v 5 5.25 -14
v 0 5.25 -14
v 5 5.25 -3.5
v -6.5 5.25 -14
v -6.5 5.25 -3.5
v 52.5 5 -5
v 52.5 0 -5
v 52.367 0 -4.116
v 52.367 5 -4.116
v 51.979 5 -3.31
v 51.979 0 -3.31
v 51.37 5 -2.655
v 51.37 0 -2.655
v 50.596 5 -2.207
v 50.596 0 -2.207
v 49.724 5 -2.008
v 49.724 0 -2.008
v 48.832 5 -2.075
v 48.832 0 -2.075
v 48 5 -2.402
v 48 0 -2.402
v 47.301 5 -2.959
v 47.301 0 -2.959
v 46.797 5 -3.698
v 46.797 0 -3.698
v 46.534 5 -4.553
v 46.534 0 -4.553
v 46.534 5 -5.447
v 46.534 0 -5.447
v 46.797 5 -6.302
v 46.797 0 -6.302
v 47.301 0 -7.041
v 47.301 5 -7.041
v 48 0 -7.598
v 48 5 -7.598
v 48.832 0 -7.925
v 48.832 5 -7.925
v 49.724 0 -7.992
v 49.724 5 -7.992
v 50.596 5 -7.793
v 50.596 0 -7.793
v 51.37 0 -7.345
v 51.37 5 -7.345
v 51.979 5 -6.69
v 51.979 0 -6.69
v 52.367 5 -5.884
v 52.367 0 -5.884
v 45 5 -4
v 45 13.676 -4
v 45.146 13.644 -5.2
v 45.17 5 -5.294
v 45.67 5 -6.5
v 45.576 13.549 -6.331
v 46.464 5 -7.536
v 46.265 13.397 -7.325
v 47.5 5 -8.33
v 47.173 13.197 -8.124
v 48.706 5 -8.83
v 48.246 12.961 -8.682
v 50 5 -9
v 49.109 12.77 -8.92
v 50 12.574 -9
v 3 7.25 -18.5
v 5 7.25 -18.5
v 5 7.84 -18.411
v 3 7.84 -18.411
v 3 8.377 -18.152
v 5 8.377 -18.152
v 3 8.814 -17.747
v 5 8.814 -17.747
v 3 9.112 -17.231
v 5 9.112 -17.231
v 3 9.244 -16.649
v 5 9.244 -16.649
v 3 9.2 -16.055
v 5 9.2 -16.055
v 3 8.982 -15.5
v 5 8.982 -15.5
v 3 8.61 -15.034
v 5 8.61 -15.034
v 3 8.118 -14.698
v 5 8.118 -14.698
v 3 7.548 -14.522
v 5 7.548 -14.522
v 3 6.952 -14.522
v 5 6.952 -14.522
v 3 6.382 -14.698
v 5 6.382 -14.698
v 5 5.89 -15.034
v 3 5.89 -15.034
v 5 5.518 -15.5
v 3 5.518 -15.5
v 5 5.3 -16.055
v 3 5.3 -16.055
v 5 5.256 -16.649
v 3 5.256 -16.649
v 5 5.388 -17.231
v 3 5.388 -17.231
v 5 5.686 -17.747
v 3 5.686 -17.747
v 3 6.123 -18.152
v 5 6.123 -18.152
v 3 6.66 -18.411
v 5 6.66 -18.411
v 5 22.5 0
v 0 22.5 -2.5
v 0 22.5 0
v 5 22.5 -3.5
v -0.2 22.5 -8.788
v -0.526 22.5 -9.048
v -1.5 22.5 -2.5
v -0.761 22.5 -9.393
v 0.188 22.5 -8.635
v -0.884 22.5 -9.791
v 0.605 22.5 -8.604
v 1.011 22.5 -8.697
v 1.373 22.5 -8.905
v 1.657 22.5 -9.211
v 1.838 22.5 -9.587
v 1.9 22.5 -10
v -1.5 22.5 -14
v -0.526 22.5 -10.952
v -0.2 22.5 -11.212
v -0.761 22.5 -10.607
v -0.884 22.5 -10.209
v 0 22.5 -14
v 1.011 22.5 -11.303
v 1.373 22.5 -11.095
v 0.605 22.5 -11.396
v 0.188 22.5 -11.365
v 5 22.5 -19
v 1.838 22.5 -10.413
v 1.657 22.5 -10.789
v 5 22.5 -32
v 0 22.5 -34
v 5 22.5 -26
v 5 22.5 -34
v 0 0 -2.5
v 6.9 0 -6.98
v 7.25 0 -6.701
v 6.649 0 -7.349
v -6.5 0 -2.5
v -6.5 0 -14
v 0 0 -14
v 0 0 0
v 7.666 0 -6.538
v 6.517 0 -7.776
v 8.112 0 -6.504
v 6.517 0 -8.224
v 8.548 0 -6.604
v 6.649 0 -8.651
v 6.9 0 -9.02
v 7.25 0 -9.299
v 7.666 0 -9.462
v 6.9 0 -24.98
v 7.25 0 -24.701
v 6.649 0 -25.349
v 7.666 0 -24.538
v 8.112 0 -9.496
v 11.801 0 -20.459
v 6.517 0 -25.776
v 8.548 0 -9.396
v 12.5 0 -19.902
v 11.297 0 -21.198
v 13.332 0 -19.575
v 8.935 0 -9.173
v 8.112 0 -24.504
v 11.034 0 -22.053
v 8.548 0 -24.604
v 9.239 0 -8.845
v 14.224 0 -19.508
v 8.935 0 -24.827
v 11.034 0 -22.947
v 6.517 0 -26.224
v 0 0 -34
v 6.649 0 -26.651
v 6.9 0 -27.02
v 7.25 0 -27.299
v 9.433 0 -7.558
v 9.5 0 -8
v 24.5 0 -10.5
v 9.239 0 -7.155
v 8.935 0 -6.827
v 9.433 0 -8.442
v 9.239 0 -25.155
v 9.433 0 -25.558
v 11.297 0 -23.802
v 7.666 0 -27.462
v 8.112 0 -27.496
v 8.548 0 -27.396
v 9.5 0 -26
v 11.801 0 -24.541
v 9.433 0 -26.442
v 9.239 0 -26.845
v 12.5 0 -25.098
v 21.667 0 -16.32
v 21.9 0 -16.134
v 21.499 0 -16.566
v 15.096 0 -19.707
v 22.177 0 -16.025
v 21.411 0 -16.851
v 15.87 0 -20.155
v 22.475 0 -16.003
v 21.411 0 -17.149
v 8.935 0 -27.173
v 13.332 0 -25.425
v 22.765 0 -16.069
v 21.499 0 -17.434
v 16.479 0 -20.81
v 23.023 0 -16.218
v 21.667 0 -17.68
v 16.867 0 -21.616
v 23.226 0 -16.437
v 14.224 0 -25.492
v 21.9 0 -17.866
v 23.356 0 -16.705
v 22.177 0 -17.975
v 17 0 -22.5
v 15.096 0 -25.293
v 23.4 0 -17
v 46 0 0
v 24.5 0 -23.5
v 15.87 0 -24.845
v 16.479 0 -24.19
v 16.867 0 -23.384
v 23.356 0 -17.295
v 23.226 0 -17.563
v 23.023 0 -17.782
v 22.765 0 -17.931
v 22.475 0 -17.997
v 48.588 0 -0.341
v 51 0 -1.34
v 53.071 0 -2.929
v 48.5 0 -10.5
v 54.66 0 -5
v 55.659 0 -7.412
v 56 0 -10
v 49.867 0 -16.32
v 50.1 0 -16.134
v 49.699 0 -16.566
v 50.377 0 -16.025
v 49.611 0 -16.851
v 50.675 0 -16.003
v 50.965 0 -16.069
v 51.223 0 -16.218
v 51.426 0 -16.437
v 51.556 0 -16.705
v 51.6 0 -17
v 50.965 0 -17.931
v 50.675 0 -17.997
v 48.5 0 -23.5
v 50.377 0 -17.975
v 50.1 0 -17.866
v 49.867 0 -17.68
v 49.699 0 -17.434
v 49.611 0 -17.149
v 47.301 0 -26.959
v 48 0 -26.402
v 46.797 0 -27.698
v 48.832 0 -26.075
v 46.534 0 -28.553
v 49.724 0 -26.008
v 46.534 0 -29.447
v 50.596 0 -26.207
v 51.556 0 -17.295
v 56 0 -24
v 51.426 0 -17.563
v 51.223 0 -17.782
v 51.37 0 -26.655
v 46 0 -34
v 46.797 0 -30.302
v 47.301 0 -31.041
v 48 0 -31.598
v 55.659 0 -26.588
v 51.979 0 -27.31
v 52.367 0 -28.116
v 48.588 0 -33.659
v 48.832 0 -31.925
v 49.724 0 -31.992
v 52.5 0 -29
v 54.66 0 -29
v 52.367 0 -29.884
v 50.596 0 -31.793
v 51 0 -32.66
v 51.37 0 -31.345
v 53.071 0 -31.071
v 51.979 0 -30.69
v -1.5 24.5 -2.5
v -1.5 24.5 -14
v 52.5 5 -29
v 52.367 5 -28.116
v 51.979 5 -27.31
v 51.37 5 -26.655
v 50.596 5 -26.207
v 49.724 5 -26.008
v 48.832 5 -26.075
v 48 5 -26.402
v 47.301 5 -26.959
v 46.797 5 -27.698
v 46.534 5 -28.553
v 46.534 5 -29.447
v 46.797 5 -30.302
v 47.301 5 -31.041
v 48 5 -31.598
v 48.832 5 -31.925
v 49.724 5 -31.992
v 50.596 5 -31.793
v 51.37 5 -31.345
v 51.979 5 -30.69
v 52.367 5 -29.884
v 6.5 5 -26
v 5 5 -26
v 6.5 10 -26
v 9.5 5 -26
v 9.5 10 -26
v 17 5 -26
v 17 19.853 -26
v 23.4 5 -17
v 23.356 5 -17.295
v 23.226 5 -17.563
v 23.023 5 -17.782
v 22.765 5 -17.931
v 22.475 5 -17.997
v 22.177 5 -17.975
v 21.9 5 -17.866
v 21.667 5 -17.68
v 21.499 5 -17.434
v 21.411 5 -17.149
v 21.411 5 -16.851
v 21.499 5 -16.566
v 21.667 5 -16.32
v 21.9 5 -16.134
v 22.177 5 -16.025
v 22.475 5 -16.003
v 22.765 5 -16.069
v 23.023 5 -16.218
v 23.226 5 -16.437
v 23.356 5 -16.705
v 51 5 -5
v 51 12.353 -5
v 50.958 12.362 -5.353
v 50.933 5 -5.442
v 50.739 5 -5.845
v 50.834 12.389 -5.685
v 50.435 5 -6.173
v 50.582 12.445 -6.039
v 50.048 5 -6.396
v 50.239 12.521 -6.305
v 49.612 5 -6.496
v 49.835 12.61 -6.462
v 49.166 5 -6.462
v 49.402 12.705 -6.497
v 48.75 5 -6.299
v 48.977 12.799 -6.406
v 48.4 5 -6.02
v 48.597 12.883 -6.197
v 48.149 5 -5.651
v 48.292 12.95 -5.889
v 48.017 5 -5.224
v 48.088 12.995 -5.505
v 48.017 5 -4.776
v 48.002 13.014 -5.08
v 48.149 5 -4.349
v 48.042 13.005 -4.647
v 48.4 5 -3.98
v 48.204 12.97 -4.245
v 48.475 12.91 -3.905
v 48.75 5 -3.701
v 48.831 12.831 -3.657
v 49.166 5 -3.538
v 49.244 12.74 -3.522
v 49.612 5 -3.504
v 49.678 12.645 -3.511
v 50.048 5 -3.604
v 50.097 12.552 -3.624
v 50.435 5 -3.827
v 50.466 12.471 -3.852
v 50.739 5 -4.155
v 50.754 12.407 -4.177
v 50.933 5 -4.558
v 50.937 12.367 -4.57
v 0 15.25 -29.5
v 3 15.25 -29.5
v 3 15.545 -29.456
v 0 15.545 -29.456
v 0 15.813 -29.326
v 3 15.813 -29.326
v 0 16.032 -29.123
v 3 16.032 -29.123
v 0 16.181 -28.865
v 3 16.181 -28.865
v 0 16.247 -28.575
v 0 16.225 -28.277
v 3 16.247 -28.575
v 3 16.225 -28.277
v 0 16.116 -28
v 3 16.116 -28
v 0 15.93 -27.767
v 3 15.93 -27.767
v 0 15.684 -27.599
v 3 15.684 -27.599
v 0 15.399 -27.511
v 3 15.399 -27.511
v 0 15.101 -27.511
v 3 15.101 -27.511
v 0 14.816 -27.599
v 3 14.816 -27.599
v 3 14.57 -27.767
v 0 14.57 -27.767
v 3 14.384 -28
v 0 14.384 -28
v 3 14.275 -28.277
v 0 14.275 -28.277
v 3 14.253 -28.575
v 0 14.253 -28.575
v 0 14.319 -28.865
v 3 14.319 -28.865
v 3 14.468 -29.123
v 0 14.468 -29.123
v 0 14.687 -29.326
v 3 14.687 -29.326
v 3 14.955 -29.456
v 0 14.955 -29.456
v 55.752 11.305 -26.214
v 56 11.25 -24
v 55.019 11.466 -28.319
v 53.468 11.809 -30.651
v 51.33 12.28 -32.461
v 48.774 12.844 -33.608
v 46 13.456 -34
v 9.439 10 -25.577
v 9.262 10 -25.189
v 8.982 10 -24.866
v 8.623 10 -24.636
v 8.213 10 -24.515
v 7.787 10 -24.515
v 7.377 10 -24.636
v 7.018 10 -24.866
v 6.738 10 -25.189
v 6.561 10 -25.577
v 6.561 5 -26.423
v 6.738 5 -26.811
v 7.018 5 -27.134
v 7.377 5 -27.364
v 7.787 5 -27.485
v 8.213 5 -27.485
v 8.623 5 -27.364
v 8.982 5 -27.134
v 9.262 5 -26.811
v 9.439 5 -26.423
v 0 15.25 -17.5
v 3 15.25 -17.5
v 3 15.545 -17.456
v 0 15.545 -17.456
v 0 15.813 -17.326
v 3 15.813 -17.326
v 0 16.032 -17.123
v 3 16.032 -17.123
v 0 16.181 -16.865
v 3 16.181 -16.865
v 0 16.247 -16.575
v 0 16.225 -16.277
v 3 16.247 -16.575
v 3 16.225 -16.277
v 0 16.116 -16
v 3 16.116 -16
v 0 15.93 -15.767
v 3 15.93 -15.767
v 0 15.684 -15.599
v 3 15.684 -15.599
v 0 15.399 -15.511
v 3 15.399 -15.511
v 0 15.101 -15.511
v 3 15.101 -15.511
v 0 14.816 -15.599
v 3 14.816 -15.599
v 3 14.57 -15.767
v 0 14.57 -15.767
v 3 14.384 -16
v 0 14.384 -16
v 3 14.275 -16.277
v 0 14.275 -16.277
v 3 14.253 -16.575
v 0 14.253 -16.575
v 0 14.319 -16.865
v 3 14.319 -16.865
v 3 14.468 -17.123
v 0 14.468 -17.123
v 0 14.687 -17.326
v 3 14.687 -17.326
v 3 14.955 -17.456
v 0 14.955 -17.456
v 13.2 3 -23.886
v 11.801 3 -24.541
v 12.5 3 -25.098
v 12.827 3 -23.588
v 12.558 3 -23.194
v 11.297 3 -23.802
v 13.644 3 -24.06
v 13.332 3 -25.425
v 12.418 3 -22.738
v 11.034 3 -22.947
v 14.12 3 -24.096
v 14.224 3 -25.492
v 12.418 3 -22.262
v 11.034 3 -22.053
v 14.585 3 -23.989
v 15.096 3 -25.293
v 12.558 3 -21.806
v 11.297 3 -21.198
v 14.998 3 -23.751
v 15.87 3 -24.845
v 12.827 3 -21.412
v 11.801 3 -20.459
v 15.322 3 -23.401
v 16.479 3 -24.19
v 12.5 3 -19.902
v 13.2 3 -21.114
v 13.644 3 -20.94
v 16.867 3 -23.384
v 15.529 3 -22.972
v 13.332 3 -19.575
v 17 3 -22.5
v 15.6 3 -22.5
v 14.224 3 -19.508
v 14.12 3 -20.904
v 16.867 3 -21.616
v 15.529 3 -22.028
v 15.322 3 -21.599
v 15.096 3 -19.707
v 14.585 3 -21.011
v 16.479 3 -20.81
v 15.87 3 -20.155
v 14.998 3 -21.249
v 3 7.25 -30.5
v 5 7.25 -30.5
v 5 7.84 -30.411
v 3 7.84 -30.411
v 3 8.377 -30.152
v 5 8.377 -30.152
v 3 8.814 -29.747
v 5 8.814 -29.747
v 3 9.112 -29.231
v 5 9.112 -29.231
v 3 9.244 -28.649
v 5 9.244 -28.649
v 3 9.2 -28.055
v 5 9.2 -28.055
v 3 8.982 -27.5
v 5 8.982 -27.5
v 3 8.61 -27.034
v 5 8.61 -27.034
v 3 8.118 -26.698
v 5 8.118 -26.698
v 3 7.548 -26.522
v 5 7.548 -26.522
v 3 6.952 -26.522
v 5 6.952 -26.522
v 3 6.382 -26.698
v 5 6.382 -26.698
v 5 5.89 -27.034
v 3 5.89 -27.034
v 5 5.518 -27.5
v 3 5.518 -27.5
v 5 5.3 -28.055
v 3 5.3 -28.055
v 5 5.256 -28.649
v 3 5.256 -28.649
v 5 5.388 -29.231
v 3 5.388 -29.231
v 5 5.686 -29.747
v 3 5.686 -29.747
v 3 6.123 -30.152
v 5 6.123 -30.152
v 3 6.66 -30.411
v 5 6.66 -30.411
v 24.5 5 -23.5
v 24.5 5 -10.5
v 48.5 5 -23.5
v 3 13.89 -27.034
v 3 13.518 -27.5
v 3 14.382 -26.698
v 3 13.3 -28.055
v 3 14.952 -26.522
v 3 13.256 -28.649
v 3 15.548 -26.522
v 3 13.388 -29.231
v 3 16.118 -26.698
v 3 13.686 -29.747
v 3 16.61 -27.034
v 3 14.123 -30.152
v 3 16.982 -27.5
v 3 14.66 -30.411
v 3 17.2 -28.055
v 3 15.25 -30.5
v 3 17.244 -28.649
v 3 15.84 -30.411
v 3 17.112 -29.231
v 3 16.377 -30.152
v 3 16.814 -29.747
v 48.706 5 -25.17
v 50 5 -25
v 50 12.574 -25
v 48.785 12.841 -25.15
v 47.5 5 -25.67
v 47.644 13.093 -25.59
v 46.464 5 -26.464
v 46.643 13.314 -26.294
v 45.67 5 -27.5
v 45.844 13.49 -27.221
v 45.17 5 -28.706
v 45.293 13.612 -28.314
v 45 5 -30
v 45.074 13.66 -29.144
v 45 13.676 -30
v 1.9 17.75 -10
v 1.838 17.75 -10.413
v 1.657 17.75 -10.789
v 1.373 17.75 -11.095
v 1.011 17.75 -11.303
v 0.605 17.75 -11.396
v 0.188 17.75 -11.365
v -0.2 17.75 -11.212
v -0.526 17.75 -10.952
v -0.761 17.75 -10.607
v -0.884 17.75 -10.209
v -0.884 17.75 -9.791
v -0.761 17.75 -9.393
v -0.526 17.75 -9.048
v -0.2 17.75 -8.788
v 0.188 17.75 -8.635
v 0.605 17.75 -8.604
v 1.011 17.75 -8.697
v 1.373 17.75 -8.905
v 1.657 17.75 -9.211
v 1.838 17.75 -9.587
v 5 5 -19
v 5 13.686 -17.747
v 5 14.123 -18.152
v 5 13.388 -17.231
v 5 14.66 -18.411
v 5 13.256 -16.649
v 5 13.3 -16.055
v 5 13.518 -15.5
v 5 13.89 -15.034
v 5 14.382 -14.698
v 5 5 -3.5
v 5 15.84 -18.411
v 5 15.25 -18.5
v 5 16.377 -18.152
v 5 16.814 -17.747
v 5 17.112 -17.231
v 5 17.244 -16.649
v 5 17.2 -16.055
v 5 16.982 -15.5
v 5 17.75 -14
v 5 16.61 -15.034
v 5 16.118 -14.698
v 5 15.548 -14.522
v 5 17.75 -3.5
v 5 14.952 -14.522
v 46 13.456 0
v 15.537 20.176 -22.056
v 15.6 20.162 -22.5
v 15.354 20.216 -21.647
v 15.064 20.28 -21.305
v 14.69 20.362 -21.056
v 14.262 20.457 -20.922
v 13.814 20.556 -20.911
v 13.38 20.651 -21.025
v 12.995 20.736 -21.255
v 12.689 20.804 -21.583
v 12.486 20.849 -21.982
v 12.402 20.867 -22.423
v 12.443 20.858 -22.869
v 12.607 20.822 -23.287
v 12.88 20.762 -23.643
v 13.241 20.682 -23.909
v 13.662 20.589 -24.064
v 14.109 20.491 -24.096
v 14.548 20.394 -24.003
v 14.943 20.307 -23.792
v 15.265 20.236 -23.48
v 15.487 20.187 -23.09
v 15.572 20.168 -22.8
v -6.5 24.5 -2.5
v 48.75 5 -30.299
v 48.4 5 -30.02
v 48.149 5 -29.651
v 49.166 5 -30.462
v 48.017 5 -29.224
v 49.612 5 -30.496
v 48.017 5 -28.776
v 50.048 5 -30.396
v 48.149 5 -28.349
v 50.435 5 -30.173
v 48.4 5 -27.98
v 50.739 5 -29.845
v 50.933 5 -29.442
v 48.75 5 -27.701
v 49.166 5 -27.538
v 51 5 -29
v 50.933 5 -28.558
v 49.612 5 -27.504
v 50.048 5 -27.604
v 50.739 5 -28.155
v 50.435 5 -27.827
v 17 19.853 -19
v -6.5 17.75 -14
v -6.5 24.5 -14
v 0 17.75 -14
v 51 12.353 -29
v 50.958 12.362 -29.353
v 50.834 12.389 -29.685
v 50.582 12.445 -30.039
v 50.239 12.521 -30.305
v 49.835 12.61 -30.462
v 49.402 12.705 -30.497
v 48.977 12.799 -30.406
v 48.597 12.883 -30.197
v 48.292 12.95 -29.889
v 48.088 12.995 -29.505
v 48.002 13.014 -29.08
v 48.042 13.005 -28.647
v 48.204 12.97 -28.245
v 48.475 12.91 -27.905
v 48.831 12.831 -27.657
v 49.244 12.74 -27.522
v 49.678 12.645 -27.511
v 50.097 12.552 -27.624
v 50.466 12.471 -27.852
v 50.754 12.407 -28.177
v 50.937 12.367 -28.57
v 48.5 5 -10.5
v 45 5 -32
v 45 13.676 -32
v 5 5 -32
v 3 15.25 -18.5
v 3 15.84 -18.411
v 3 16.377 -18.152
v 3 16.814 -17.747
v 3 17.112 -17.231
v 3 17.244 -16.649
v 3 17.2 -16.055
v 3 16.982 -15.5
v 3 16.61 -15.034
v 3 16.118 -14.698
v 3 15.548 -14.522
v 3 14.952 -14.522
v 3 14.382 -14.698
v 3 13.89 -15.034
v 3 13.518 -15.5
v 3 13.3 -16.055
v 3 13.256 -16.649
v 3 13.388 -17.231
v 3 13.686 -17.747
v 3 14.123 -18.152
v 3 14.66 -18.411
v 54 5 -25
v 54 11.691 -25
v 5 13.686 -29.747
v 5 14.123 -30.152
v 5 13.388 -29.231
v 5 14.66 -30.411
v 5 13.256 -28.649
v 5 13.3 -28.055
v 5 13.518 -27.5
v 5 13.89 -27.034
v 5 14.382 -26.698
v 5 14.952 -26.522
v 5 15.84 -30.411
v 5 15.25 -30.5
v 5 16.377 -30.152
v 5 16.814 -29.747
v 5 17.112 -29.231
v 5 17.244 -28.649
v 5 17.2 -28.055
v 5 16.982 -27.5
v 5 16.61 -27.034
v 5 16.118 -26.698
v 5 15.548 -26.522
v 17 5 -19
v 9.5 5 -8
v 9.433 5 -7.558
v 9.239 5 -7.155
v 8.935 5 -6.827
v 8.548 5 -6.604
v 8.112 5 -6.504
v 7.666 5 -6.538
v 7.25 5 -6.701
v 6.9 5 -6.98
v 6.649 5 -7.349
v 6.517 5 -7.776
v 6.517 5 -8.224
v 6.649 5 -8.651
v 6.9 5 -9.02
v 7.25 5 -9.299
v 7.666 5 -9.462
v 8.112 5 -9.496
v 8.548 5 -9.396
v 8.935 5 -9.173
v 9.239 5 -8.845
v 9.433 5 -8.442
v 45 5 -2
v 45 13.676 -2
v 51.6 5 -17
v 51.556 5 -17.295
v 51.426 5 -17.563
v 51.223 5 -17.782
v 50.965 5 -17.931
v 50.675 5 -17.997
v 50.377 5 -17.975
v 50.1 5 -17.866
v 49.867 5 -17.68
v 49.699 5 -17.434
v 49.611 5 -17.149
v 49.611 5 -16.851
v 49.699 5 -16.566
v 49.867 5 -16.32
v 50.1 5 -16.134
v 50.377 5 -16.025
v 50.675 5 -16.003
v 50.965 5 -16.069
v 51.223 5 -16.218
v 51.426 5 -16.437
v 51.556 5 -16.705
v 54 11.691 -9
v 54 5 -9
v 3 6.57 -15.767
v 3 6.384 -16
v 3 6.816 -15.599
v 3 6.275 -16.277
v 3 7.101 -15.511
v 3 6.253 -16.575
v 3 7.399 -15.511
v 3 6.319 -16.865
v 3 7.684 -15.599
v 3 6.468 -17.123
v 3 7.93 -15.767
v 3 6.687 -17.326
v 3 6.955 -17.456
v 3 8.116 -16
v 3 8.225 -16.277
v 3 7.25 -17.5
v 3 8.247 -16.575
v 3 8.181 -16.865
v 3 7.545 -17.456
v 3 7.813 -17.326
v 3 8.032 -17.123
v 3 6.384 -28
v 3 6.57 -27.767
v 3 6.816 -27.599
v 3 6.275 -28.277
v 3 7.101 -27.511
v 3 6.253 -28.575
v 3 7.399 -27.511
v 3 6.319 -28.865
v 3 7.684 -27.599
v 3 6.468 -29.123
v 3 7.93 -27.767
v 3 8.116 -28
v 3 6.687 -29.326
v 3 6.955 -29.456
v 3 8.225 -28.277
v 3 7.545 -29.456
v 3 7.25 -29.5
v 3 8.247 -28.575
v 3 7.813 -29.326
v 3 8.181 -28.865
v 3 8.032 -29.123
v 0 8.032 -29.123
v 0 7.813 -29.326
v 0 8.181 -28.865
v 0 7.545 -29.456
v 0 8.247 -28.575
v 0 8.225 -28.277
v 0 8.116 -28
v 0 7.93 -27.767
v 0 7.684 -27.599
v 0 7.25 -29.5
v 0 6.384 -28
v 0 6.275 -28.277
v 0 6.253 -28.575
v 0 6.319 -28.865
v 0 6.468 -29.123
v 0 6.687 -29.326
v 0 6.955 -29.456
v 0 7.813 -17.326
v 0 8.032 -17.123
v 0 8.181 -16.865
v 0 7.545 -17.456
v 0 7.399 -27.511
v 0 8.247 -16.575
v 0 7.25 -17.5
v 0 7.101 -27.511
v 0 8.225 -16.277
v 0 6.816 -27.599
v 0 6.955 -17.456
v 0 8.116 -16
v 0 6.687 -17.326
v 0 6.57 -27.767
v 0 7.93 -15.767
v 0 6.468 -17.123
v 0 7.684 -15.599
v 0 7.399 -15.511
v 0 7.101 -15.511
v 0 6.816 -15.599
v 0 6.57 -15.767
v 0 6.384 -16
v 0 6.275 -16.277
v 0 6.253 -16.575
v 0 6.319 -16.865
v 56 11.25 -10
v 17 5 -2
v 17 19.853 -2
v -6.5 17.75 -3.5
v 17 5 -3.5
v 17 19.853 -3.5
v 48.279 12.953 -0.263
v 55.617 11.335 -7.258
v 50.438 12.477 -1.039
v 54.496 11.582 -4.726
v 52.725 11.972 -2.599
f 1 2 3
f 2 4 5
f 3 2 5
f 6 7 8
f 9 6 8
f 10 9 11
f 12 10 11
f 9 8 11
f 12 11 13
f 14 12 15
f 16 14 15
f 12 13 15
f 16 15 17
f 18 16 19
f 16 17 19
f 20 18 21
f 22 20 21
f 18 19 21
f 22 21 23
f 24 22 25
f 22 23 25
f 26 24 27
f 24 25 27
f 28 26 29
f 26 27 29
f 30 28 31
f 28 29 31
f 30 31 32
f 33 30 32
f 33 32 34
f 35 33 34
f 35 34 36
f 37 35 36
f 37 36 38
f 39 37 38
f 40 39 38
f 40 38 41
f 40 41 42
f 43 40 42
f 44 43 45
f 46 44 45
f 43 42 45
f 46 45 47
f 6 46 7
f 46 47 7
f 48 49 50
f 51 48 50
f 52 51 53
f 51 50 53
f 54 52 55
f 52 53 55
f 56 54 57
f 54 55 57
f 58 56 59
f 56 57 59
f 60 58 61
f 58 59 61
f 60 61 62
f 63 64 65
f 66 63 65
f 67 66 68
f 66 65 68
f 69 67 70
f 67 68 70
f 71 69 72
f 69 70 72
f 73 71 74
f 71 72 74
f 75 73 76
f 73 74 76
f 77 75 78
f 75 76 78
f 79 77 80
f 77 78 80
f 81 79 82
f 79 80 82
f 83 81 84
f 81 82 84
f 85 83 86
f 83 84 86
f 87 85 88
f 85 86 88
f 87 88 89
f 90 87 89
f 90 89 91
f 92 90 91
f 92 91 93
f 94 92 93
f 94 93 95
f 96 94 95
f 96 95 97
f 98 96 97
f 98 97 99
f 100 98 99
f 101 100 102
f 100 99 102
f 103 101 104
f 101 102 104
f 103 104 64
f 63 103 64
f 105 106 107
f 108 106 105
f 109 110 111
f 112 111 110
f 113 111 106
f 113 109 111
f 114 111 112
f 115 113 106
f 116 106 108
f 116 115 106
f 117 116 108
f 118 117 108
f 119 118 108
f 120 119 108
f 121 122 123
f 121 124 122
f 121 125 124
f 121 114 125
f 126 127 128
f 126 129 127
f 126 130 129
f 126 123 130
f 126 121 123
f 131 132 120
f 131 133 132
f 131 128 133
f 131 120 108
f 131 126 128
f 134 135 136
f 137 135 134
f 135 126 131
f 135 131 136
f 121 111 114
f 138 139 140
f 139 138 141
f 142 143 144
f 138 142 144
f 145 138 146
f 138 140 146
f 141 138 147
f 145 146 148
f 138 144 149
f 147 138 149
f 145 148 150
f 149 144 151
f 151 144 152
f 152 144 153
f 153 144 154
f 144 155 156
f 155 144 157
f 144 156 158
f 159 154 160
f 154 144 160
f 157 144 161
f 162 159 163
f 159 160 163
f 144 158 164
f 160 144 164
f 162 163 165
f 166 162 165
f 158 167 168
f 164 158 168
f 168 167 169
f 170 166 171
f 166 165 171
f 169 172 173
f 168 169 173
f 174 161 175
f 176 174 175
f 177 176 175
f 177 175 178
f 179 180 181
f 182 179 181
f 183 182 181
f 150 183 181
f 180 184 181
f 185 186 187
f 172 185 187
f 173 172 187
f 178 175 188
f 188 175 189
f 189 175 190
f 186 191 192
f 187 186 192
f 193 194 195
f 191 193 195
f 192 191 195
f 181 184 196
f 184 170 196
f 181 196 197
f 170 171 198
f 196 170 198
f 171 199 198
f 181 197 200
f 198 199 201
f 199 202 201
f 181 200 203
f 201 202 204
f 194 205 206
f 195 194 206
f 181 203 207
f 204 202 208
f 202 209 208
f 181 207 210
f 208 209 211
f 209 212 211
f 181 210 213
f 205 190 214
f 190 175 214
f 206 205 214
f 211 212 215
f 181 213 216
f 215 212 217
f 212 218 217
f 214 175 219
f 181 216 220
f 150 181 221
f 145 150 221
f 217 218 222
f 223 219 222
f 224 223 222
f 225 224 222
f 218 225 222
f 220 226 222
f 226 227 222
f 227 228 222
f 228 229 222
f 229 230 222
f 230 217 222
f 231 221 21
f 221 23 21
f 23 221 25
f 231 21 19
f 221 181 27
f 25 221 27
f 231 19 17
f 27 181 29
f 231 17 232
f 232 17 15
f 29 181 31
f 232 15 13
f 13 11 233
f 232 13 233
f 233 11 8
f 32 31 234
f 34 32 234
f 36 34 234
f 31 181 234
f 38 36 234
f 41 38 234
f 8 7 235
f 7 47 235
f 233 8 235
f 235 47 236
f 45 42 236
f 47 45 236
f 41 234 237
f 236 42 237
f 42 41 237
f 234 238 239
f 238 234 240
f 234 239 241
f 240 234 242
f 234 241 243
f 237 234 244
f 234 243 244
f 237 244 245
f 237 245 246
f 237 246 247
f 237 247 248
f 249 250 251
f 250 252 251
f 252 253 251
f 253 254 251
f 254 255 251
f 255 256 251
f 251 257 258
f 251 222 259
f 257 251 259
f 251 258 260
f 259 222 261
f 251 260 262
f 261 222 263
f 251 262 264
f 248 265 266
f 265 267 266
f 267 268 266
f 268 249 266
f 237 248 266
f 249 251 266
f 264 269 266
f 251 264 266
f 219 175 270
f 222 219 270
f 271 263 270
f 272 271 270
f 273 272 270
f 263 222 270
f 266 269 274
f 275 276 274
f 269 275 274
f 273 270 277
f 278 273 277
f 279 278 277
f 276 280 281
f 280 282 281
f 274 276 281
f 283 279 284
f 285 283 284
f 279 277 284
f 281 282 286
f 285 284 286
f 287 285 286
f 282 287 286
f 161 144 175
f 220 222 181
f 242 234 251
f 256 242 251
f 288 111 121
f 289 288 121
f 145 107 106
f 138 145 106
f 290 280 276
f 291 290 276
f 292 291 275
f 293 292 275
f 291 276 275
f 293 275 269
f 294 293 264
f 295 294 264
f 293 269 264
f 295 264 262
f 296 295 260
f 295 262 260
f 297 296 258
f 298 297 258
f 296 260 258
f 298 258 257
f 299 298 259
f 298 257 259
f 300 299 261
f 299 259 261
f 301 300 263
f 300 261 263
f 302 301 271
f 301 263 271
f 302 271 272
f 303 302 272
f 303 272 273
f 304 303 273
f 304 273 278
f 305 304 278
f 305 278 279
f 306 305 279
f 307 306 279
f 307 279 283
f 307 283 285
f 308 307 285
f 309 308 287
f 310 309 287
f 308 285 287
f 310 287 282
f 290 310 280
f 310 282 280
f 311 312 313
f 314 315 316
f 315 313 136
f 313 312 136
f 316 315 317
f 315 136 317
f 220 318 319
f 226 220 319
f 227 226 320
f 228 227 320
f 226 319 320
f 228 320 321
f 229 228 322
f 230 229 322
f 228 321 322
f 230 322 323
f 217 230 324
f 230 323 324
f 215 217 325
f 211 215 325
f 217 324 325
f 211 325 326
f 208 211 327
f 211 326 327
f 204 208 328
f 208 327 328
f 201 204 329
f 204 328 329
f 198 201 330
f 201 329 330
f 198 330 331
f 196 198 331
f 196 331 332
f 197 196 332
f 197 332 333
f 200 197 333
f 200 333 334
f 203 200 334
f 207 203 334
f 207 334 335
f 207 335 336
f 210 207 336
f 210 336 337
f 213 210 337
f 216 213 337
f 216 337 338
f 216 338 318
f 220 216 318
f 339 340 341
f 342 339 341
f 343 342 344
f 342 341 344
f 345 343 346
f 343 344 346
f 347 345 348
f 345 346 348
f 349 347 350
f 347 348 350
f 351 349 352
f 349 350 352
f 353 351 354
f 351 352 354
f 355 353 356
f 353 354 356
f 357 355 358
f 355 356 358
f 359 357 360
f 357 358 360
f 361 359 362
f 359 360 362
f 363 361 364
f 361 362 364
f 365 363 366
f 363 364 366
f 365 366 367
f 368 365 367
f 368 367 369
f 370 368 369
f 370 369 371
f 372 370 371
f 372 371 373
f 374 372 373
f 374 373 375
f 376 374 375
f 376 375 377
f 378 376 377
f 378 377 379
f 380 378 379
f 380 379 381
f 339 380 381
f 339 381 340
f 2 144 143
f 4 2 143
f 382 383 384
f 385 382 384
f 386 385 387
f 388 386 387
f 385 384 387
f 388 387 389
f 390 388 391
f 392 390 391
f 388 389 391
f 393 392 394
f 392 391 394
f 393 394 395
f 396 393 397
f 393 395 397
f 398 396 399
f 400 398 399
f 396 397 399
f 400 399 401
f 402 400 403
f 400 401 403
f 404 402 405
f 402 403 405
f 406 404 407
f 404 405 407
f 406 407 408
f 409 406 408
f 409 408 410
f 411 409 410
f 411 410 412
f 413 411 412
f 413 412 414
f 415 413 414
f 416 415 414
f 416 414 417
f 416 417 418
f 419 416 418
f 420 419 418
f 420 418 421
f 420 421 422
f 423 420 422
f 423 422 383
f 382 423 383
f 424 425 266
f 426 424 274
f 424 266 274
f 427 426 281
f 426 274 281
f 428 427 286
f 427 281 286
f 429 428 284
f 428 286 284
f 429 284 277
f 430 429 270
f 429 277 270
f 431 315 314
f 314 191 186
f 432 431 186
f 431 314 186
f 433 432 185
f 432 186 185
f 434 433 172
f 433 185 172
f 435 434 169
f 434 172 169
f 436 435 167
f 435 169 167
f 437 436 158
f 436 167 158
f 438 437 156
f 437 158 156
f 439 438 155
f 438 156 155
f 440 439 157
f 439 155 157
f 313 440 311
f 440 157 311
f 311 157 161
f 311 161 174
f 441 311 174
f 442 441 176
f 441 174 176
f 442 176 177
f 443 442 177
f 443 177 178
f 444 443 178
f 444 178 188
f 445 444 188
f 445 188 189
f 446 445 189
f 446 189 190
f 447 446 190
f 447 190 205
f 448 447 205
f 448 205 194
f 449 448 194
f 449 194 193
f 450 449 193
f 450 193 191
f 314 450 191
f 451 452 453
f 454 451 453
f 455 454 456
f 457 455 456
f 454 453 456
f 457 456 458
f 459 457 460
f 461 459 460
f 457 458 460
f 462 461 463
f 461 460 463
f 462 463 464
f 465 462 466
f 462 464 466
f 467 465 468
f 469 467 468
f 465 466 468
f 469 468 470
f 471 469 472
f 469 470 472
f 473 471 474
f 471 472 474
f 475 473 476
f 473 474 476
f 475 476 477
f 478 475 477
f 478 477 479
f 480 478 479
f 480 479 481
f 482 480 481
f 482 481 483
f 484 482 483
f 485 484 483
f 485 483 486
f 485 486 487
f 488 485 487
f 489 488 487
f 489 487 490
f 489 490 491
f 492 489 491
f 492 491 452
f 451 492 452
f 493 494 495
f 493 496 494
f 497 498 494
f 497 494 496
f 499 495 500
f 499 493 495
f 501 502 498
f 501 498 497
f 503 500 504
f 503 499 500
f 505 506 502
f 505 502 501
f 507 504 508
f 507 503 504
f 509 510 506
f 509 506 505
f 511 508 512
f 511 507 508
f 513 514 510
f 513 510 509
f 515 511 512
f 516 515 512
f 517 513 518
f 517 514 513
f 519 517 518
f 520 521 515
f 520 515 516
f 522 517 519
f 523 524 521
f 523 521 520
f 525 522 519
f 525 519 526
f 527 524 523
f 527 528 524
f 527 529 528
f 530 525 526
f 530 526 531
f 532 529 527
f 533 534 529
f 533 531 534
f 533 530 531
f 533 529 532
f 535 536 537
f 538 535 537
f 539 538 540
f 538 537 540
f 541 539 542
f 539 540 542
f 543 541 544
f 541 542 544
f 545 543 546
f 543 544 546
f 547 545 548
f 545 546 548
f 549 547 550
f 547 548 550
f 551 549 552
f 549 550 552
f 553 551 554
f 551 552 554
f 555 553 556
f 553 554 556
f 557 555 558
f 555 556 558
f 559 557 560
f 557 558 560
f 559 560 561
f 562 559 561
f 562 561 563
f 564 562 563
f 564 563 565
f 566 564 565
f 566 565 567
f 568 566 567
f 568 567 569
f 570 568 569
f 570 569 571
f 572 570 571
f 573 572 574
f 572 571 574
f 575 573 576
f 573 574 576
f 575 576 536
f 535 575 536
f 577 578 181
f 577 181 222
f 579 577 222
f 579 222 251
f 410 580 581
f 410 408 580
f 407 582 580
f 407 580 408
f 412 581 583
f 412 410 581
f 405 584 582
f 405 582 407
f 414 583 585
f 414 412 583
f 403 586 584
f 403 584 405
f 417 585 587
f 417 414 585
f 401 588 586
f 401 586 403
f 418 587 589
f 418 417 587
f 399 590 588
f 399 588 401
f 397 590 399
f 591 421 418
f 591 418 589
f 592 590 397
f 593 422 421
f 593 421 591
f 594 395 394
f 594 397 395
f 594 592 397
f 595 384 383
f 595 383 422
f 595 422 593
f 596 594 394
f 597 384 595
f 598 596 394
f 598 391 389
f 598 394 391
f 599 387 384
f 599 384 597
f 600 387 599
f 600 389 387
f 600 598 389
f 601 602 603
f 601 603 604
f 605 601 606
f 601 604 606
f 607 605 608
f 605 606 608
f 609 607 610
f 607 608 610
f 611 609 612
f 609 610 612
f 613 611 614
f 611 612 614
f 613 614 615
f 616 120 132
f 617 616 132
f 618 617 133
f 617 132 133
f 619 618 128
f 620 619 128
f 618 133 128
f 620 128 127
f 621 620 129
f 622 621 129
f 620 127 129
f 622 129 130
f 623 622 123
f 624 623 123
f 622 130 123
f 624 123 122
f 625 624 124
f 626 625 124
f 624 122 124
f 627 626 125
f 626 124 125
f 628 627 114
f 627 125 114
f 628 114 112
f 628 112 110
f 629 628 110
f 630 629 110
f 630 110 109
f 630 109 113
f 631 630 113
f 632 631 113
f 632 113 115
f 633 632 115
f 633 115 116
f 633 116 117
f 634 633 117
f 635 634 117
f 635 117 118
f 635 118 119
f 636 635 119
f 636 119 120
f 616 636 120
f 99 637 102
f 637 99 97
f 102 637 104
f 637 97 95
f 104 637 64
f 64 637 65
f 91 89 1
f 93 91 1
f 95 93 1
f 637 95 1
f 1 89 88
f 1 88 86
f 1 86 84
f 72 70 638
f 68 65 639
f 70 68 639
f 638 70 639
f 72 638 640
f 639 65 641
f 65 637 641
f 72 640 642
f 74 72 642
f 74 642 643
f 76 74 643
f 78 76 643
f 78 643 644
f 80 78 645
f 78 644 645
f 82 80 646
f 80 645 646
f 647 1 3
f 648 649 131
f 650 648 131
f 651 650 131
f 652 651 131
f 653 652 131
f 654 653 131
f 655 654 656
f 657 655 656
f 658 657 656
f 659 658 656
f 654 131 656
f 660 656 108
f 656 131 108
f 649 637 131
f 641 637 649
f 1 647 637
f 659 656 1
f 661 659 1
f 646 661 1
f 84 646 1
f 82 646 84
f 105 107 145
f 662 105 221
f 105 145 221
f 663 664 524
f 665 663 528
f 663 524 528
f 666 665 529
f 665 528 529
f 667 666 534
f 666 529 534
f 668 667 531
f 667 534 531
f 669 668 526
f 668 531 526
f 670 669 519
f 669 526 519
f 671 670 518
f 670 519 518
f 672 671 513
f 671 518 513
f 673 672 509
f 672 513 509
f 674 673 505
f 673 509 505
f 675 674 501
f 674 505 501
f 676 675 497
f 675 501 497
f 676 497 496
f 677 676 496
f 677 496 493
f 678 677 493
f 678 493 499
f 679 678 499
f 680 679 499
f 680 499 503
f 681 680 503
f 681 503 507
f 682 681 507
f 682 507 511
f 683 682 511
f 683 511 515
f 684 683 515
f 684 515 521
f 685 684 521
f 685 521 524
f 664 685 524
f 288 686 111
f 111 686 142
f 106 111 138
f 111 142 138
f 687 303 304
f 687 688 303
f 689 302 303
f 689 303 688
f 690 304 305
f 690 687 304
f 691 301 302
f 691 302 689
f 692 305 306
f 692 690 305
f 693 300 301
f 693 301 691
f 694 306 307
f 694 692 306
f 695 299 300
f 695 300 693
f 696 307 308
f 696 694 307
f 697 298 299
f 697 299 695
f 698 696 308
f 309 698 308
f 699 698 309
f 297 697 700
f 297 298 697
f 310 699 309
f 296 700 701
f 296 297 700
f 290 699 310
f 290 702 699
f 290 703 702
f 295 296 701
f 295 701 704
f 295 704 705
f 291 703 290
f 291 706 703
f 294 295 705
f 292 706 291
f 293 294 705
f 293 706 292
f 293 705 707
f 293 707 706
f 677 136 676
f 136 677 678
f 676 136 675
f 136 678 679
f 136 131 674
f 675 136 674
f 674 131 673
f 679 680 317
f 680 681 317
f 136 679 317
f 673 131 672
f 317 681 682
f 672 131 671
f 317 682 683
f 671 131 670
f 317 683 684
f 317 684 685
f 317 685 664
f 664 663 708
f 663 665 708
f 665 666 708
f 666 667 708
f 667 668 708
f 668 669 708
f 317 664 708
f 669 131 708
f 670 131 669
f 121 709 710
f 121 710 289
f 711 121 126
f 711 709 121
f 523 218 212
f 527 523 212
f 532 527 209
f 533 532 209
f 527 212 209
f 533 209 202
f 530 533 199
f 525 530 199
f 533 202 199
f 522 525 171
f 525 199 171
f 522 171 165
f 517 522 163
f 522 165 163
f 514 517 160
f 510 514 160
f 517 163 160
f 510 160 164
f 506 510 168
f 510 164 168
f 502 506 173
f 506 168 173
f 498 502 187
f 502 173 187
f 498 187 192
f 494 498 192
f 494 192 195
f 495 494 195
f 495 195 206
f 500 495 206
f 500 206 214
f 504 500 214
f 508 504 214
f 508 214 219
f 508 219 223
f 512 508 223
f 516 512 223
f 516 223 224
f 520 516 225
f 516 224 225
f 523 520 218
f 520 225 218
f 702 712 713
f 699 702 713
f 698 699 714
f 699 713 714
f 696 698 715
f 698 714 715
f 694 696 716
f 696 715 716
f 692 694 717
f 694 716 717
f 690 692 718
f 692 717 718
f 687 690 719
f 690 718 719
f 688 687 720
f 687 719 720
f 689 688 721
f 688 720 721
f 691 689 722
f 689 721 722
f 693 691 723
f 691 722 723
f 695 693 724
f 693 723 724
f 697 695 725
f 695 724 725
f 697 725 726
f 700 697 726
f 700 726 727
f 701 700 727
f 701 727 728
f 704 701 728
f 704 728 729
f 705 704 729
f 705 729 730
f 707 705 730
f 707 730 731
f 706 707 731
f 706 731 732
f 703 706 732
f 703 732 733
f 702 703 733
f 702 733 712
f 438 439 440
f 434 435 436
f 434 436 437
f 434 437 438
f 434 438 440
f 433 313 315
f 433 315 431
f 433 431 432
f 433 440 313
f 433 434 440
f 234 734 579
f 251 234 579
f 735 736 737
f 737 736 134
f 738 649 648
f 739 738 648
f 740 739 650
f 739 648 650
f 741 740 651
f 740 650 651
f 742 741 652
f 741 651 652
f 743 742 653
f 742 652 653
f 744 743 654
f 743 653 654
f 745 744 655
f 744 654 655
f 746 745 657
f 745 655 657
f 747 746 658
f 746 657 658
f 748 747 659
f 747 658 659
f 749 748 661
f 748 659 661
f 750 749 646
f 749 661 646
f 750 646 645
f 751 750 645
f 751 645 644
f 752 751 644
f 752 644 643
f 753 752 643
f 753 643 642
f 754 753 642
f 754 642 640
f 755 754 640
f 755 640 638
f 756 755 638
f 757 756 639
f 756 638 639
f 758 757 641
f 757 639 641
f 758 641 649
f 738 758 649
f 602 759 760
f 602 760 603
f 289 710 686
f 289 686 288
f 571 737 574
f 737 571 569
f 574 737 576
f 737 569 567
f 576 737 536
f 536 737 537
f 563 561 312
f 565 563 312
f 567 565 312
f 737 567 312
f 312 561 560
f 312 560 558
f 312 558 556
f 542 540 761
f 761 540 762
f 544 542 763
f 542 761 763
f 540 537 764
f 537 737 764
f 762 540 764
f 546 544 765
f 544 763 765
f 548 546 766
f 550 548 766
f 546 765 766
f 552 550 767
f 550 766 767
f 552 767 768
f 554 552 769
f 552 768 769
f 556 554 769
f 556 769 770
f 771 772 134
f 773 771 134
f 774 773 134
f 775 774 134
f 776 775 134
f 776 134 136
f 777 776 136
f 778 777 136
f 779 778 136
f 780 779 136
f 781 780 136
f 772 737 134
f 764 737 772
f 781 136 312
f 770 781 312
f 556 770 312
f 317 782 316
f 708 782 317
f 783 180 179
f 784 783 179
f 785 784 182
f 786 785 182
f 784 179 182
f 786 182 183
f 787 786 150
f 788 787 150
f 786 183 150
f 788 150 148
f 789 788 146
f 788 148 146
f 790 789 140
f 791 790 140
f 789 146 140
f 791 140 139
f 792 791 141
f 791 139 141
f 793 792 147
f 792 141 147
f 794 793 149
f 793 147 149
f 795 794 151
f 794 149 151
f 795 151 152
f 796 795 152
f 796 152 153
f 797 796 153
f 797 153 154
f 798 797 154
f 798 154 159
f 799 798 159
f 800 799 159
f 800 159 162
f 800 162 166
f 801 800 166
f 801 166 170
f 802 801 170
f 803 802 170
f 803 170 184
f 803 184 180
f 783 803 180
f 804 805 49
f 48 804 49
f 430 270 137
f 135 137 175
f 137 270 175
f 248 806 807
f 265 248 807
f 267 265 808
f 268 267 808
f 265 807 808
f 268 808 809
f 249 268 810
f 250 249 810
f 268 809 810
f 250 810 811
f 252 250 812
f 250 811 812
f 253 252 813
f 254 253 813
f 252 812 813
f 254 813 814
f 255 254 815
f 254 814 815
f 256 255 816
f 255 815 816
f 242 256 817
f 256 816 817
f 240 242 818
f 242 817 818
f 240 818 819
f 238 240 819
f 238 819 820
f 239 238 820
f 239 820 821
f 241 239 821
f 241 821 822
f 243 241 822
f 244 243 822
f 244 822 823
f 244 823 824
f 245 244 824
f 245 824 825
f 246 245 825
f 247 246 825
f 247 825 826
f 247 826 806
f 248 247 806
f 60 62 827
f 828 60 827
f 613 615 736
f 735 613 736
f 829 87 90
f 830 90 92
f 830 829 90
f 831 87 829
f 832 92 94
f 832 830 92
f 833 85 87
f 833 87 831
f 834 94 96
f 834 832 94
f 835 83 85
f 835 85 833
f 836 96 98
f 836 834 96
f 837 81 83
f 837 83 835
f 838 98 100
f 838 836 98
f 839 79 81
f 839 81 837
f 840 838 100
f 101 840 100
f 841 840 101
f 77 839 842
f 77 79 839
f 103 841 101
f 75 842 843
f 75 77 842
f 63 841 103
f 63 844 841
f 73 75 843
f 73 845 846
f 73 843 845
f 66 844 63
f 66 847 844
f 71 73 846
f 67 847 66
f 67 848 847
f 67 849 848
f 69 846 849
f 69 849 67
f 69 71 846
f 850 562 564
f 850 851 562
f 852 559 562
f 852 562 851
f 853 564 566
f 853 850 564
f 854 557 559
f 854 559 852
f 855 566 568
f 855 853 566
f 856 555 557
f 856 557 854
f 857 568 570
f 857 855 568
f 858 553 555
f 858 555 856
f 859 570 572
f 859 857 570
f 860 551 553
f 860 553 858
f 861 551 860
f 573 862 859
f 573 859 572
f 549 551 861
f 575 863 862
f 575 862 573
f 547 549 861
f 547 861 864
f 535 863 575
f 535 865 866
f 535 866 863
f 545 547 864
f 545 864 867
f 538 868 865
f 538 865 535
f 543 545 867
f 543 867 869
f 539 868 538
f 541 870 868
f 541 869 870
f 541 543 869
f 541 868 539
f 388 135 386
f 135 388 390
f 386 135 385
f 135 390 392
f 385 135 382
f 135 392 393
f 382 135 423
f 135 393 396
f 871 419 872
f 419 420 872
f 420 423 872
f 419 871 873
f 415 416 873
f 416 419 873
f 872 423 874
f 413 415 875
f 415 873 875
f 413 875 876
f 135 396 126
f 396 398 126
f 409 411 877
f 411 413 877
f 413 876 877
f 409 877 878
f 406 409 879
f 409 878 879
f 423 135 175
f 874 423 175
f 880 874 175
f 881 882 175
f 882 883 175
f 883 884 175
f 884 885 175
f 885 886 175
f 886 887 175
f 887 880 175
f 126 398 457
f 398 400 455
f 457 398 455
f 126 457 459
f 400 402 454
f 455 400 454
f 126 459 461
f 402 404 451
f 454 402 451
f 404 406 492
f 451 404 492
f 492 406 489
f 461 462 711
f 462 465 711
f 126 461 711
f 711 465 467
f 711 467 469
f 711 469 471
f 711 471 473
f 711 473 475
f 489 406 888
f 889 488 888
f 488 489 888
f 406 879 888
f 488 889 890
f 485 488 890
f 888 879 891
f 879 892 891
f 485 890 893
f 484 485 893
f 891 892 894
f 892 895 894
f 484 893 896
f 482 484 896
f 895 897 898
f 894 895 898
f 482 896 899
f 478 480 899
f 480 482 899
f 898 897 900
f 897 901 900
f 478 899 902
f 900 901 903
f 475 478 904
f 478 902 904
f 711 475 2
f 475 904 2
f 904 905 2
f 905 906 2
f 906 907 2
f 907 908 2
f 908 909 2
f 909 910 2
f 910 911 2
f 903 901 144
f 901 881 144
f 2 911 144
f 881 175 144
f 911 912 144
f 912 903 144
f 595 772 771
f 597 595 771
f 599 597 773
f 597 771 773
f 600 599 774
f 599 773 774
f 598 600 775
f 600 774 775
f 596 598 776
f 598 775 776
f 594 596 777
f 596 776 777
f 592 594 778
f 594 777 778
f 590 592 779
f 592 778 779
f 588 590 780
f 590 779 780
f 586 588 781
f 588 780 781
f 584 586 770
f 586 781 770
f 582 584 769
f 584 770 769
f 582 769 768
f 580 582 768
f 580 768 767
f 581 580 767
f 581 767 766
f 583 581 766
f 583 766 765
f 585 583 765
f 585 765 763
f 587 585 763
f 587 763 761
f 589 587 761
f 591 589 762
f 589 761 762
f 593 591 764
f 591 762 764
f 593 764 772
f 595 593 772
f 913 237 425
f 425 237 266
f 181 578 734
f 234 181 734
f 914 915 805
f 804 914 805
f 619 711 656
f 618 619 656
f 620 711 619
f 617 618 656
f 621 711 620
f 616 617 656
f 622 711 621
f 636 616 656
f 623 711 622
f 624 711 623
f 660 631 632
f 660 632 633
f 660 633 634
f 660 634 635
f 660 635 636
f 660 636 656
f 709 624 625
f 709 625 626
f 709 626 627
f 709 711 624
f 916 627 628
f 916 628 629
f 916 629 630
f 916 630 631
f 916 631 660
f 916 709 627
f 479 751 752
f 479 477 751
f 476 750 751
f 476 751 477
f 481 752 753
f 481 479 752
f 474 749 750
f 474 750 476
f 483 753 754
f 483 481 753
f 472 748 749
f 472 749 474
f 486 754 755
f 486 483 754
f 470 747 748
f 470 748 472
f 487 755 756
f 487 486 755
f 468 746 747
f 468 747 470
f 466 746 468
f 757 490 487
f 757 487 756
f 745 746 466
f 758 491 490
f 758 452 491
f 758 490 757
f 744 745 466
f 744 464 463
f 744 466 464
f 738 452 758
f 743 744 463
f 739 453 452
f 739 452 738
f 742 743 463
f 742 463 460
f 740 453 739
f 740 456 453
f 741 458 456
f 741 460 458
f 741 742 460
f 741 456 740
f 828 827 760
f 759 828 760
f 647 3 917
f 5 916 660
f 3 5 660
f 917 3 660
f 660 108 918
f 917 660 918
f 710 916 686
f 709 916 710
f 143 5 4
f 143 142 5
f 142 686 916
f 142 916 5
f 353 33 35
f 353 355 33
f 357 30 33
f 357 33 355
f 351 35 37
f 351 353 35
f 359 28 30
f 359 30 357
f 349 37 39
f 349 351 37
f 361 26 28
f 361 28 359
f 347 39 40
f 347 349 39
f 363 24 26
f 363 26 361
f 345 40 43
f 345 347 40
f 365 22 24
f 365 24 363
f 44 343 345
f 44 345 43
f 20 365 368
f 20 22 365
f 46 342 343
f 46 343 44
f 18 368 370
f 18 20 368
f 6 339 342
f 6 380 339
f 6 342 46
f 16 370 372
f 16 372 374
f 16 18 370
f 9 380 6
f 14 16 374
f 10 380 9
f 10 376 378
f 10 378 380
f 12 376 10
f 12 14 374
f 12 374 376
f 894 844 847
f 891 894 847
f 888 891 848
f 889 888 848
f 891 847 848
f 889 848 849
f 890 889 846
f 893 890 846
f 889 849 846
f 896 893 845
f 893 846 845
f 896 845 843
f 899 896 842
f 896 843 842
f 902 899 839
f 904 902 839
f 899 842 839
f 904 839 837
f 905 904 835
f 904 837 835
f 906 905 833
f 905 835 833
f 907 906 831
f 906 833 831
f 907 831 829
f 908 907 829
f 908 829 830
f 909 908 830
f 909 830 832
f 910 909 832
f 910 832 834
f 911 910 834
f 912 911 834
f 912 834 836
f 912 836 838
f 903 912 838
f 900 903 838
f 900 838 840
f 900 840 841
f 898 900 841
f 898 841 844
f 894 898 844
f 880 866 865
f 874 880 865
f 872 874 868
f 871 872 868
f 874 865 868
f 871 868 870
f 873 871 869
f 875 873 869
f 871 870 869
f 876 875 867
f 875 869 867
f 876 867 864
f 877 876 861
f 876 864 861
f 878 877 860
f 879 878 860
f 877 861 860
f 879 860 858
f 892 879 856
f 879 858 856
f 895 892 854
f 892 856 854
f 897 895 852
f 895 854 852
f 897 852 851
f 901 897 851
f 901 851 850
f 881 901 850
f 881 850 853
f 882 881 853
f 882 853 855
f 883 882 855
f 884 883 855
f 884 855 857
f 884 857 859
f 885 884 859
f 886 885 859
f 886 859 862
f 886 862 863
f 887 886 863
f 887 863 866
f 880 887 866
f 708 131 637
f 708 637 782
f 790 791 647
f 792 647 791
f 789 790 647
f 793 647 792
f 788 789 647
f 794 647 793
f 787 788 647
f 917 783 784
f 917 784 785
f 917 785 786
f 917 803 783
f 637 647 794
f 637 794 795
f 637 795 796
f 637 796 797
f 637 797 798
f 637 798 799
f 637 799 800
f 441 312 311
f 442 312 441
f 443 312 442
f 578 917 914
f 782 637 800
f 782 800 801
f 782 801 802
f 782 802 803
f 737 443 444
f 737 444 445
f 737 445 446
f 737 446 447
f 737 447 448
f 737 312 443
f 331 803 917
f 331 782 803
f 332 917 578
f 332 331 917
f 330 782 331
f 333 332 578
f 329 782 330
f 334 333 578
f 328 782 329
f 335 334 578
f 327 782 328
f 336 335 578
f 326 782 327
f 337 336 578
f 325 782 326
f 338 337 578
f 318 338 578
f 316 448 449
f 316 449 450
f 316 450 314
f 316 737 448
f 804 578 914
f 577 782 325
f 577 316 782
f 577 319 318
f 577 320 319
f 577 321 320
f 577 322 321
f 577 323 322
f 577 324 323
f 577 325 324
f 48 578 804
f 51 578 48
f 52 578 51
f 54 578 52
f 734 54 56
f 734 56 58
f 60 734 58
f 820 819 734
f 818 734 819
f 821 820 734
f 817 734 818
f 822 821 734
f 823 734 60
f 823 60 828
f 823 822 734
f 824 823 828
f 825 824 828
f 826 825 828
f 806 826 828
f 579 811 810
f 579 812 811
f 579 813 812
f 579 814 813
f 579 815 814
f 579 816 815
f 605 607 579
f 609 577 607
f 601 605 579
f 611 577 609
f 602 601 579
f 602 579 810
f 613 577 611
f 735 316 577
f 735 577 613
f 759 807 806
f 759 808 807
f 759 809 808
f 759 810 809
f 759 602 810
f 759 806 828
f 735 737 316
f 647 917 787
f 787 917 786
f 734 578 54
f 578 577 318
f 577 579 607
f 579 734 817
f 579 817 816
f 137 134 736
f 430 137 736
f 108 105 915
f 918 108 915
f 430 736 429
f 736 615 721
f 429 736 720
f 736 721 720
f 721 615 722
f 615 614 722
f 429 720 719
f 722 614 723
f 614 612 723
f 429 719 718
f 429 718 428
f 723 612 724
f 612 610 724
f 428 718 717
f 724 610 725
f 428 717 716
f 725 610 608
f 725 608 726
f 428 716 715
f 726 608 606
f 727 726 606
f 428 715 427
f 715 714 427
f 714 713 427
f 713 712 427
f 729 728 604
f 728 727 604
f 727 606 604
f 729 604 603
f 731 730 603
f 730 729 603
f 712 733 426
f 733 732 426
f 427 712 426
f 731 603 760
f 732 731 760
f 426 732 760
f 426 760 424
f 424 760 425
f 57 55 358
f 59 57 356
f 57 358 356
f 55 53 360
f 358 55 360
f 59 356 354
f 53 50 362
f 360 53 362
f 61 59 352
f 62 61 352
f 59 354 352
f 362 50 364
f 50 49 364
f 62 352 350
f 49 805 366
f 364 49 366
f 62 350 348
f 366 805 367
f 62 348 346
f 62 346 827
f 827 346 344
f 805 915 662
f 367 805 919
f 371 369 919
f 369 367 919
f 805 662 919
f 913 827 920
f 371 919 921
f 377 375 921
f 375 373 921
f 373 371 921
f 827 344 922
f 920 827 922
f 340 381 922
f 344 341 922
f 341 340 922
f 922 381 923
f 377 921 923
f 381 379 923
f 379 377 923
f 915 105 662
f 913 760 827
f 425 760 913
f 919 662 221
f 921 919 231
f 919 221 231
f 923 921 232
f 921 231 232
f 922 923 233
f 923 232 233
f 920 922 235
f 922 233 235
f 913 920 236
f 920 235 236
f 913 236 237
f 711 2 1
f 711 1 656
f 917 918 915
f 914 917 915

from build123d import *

# Parameters (mm, degrees)
BOSS_EXTRUDE1_DEPTH     = 22.5
CUT_EXTRUDE1_DEPTH      = 17.5
SKETCH4_R               = 1
CUT_EXTRUDE2_DEPTH      = 15
CUT_EXTRUDE2_DEPTH_BACK = 12.5
SKETCH5_W               = 10.5
SKETCH5_H               = 12.5
CUT_EXTRUDE3_DEPTH      = 20
SKETCH6_R               = 1.4
CUT_EXTRUDE4_DEPTH      = 10
SKETCH8_R               = 1
SKETCH8_W               = 24
SKETCH8_H               = 13
CUT_EXTRUDE6_DEPTH      = 6
SKETCH9_R               = 1.5
CUT_EXTRUDE7_DEPTH      = 23.5
SKETCH10_R              = 3
CUT_EXTRUDE8_DEPTH      = 5
SKETCH14_W              = 12
SKETCH14_H              = 17.5
BOSS_EXTRUDE3_DEPTH     = 3.5
SKETCH11_R              = 1.5
CUT_EXTRUDE9_DEPTH      = 10
SKETCH16_R              = 2
CUT_EXTRUDE11_DEPTH     = 2
SKETCH18_W              = 6.5
SKETCH18_H              = 2.5
CUT_EXTRUDE12_DEPTH     = 23.5
CUT_EXTRUDE14_DEPTH     = 35
SKETCH22_R              = 1.6
CUT_EXTRUDE15_DEPTH     = 23.5
SKETCH23_R              = 3
CUT_EXTRUDE18_DEPTH     = 3
SKETCH25_W              = 5
SKETCH25_H              = 11.5
BOSS_EXTRUDE4_DEPTH     = 2


with BuildPart() as part:
    # Sketch2 → Boss-Extrude1 (new body)
    with BuildSketch(Plane(origin=(0, 0, 0), x_dir=(1, 0, 0), z_dir=(0, 1, 0))):
        with BuildLine():
            Line((0, 0), (46, 0))
            ThreePointArc((46, 0), (53.071067812, 2.928932188), (56, 10))
            Line((56, 10), (56, 24))
            ThreePointArc((56, 24), (53.071067812, 31.071067812), (46, 34))
            Line((46, 34), (0, 34))
            Line((0, 34), (0, 14))
            Line((0, 14), (-6.5, 14))
            Line((-6.5, 14), (-6.5, 0))
            Line((-6.5, 0), (0, 0))
        make_face()
    extrude(amount=BOSS_EXTRUDE1_DEPTH)

    # Sketch3 → Cut-Extrude1 (cut)
    with BuildSketch(Plane(origin=(0, 22.5, 0), x_dir=(1, 0, 0), z_dir=(0, 1, 0))):
        with BuildLine():
            Line((45, 32), (5, 32))
            Line((5, 32), (5, 3.5))
            Line((5, 3.5), (17, 3.5))
            Line((17, 3.5), (17, 2))
            Line((17, 2), (45, 2))
            Line((45, 2), (45, 4))
            ThreePointArc((45, 4), (46.464466094, 7.535533906), (50, 9))
            Line((50, 9), (54, 9))
            Line((54, 9), (54, 25))
            Line((54, 25), (50, 25))
            ThreePointArc((50, 25), (46.464466094, 26.464466094), (45, 30))
            Line((45, 30), (45, 32))
        make_face()
    extrude(amount=-CUT_EXTRUDE1_DEPTH, mode=Mode.SUBTRACT)

    # Sketch4 → Cut-Extrude2 (cut, two sides)
    with BuildSketch(Plane(origin=(5, 0, 0), x_dir=(0, 0, -1), z_dir=(1, 0, 0))) as cut_extrude2_sk:
        with Locations((28.5, 15.25)):
            Circle(SKETCH4_R)
        with Locations((28.5, 7.25)):
            Circle(SKETCH4_R)
        with Locations((16.5, 7.25)):
            Circle(SKETCH4_R)
        with Locations((16.5, 15.25)):
            Circle(SKETCH4_R)
    extrude(amount=CUT_EXTRUDE2_DEPTH, mode=Mode.SUBTRACT)
    extrude(cut_extrude2_sk.sketch, amount=-CUT_EXTRUDE2_DEPTH_BACK, mode=Mode.SUBTRACT)

    # Sketch5 → Cut-Extrude3 (cut)
    with BuildSketch(Plane.ZY.offset(6.5)):
        with Locations((-8.75, 11.5)):
            Rectangle(SKETCH5_W, SKETCH5_H)
    extrude(amount=-CUT_EXTRUDE3_DEPTH, mode=Mode.SUBTRACT)

    # Sketch6 → Cut-Extrude4 (cut)
    with BuildSketch(Plane(origin=(0, 22.5, 0), x_dir=(1, 0, 0), z_dir=(0, 1, 0))):
        with Locations((0.5, 10)):
            Circle(SKETCH6_R)
    extrude(amount=-CUT_EXTRUDE4_DEPTH, mode=Mode.SUBTRACT)

    # Sketch8 → Cut-Extrude6 (cut, through all)
    with BuildSketch(Plane(origin=(0, 5, 0), x_dir=(1, 0, 0), z_dir=(0, 1, 0))):
        with Locations((50.6, 17)):
            Circle(SKETCH8_R)
        with Locations((22.4, 17)):
            Circle(SKETCH8_R)
        with Locations((36.5, 17)):
            Rectangle(SKETCH8_W, SKETCH8_H)
    extrude(amount=-CUT_EXTRUDE6_DEPTH, mode=Mode.SUBTRACT)

    # Sketch9 → Cut-Extrude7 (cut, through all)
    with BuildSketch(Plane(origin=(0, 22.5, 0), x_dir=(1, 0, 0), z_dir=(0, 1, 0))):
        with Locations((49.5, 29)):
            Circle(SKETCH9_R)
        with Locations((49.5, 5)):
            Circle(SKETCH9_R)
    extrude(amount=-CUT_EXTRUDE7_DEPTH, mode=Mode.SUBTRACT)

    # Sketch10 → Cut-Extrude8 (cut)
    with BuildSketch(Plane.XZ):
        with Locations((49.5, -5)):
            Circle(SKETCH10_R)
        with Locations((49.5, -29)):
            Circle(SKETCH10_R)
    extrude(amount=-CUT_EXTRUDE8_DEPTH, mode=Mode.SUBTRACT)

    # Sketch14 → Boss-Extrude3 (add, symmetric)
    with BuildSketch(Plane.XY.offset(-22.5)):
        with Locations((11, 13.75)):
            Rectangle(SKETCH14_W, SKETCH14_H)
    extrude(amount=BOSS_EXTRUDE3_DEPTH, both=True)

    # Sketch11 → Cut-Extrude9 (cut)
    with BuildSketch(Plane.XZ):
        with Locations((8, -8)):
            Circle(SKETCH11_R)
        with Locations((8, -26)):
            Circle(SKETCH11_R)
    extrude(amount=-CUT_EXTRUDE9_DEPTH, mode=Mode.SUBTRACT)

    # Sketch16 → Cut-Extrude11 (cut)
    with BuildSketch(Plane(origin=(5, 0, 0), x_dir=(0, 0, -1), z_dir=(1, 0, 0))):
        with Locations((28.5, 15.25)):
            Circle(SKETCH16_R)
        with Locations((28.5, 7.25)):
            Circle(SKETCH16_R)
        with Locations((16.5, 7.25)):
            Circle(SKETCH16_R)
        with Locations((16.5, 15.25)):
            Circle(SKETCH16_R)
    extrude(amount=-CUT_EXTRUDE11_DEPTH, mode=Mode.SUBTRACT)

    # Sketch18 → Cut-Extrude12 (cut, through all)
    with BuildSketch(Plane(origin=(0, 22.5, 0), x_dir=(1, 0, 0), z_dir=(0, 1, 0))):
        with Locations((-3.25, 1.25)):
            Rectangle(SKETCH18_W, SKETCH18_H)
    extrude(amount=-CUT_EXTRUDE12_DEPTH, mode=Mode.SUBTRACT)

    # Sketch21 → Cut-Extrude14 (cut, through all)
    with BuildSketch(Plane.XY):
        Polygon((5, 22.5), (56, 11.25), (56, 22.5), align=None)
    extrude(amount=-CUT_EXTRUDE14_DEPTH, mode=Mode.SUBTRACT)

    # Sketch22 → Cut-Extrude15 (cut, through all)
    with BuildSketch(Plane.XZ):
        with Locations((14, -22.5)):
            Circle(SKETCH22_R)
    extrude(amount=-CUT_EXTRUDE15_DEPTH, mode=Mode.SUBTRACT)

    # Sketch23 → Cut-Extrude18 (cut)
    with BuildSketch(Plane.XZ):
        with Locations((14, -22.5)):
            Circle(SKETCH23_R)
    extrude(amount=-CUT_EXTRUDE18_DEPTH, mode=Mode.SUBTRACT)

    # Sketch25 → Boss-Extrude4 (add)
    with BuildSketch(Plane(origin=(0, 22.5, 0), x_dir=(1, 0, 0), z_dir=(0, 1, 0))):
        with Locations((-4, 8.25)):
            Rectangle(SKETCH25_W, SKETCH25_H)
    extrude(amount=BOSS_EXTRUDE4_DEPTH)


solid = part.part
